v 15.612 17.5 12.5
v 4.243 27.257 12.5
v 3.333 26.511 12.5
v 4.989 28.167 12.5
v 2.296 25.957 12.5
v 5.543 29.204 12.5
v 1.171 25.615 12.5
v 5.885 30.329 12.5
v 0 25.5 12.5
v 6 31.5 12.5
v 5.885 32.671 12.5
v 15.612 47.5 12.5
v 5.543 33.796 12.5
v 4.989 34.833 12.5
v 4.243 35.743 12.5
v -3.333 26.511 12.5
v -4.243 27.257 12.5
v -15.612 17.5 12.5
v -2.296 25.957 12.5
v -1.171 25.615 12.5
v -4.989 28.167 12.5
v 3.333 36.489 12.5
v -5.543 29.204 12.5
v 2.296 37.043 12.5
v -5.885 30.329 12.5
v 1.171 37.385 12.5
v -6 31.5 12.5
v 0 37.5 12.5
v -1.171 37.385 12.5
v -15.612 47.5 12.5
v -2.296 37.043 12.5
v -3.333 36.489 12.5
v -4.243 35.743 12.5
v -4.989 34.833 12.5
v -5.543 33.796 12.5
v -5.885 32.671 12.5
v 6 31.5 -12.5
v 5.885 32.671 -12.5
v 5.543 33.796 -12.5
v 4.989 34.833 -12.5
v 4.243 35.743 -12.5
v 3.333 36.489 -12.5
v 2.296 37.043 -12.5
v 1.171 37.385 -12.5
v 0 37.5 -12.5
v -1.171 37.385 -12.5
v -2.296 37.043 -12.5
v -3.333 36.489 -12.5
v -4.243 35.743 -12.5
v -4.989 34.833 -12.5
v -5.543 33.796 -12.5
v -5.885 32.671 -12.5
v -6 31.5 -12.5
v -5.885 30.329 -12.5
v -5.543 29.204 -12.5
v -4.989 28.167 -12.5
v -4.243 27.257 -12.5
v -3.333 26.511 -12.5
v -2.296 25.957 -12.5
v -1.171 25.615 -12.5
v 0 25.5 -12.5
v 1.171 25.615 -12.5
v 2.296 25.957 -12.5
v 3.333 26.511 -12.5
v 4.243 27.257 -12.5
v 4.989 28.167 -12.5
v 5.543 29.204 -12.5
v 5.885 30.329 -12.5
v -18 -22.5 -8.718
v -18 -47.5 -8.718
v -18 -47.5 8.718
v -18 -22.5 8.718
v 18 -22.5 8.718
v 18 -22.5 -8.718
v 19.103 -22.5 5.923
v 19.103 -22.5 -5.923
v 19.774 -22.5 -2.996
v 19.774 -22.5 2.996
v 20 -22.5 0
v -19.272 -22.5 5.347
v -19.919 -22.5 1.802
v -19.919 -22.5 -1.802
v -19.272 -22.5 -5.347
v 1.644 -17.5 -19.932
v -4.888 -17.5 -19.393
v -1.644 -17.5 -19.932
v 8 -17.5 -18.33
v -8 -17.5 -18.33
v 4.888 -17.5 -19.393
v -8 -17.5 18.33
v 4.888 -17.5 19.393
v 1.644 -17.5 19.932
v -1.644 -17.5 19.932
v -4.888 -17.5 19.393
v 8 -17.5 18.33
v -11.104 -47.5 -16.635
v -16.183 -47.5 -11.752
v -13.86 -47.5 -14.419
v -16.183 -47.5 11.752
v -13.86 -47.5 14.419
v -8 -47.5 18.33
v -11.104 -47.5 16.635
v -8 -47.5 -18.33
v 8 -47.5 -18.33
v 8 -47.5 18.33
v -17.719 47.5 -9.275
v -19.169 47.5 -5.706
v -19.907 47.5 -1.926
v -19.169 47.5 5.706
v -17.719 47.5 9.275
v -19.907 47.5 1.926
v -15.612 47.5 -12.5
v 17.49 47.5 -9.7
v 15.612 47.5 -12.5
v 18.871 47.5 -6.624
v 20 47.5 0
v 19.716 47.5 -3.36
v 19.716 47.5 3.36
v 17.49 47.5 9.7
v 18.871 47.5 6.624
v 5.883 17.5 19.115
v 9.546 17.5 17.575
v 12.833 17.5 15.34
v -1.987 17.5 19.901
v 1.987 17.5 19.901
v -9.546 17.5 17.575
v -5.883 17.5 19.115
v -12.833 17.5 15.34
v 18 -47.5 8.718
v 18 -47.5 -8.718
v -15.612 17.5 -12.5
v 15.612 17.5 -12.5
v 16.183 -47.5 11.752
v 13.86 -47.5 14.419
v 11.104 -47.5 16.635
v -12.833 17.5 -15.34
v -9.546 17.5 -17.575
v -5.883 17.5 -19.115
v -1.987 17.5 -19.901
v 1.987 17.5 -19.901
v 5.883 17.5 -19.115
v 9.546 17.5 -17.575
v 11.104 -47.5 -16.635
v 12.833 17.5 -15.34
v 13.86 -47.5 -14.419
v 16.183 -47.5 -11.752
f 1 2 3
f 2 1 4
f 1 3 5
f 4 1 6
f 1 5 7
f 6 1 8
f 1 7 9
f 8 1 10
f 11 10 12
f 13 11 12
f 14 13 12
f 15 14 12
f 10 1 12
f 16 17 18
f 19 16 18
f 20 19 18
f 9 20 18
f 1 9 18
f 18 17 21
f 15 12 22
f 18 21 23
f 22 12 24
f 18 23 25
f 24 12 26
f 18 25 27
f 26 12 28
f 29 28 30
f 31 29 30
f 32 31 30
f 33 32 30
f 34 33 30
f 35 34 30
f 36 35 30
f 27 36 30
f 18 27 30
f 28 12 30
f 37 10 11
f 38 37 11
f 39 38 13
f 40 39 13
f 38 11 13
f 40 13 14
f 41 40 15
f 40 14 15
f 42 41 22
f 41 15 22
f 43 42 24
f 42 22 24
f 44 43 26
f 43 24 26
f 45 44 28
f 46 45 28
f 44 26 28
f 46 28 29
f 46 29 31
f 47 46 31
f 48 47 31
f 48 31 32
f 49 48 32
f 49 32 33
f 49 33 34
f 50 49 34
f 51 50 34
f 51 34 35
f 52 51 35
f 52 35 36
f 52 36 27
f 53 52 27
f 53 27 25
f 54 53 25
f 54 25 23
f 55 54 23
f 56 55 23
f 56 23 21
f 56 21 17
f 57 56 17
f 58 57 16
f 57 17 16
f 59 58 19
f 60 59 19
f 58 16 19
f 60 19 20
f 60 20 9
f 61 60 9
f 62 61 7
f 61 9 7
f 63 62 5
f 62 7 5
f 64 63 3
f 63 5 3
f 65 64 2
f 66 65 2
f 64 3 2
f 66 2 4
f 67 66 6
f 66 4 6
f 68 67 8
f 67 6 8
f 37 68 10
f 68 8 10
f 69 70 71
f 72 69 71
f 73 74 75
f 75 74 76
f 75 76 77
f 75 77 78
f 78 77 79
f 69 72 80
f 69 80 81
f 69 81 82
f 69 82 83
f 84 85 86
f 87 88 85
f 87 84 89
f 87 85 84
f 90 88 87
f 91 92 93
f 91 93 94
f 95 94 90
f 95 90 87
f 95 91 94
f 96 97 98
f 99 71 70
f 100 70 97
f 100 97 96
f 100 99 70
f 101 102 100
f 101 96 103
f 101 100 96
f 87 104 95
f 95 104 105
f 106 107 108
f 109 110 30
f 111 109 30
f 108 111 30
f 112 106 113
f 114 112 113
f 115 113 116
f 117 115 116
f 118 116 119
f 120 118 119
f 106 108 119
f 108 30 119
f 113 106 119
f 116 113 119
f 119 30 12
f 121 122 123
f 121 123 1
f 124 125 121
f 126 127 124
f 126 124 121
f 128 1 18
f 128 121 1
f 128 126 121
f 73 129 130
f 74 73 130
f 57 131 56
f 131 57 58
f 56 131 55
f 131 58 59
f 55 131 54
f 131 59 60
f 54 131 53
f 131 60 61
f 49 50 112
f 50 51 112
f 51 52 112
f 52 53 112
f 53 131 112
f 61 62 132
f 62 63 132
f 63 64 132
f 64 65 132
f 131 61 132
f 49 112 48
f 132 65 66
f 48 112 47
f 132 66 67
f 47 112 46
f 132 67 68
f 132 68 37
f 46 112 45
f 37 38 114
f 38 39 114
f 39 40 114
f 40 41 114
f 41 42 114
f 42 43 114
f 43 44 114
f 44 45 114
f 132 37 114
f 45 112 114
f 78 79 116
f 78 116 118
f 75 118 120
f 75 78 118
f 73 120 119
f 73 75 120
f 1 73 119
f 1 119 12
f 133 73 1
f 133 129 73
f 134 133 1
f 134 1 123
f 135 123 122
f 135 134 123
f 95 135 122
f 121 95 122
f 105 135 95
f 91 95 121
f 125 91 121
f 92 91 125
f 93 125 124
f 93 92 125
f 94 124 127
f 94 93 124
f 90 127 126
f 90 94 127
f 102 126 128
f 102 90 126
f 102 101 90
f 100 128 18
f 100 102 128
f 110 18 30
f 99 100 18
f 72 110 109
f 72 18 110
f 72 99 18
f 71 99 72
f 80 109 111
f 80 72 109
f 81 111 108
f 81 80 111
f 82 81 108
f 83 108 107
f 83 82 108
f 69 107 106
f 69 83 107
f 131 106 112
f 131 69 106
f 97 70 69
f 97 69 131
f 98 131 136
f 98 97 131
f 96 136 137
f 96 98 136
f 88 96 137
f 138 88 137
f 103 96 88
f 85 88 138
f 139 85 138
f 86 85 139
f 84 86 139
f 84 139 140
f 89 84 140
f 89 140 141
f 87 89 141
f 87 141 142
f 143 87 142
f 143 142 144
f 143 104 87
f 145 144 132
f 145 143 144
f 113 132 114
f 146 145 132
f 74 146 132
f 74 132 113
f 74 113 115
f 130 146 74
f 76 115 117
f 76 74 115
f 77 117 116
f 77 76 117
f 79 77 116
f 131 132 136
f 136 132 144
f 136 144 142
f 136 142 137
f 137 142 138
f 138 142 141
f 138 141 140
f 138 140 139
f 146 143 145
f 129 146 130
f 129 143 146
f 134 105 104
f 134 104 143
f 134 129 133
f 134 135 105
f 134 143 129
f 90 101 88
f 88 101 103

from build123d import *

# Parameters (mm, degrees)
F0_R      = 20
F1_DEPTH  = 47.5
F3_DEPTH  = 30
F5_DEPTH  = 25
F7_DEPTH  = 30
F8_R      = 6
F9_DEPTH  = 25
F10_DEPTH = 57.501


with BuildPart() as f1:
    # F0 (on Front) → F1 (new body, symmetric)
    with BuildSketch(Plane.XZ):
        Circle(F0_R)
    extrude(amount=F1_DEPTH, both=True)

    # F2 (on face) → F3 (cut)
    with BuildSketch(Plane.XZ.offset(47.5)):
        with BuildLine():
            ThreePointArc((8, 18.3303027798), (0, 20), (-8, 18.3303027798))
            Line((-8, 18.3303027798), (-8, -18.3303027798))
            ThreePointArc((-8, -18.3303027798), (0, -20), (8, -18.3303027798))
            Line((8, -18.3303027798), (8, 18.3303027798))
        make_face()
    extrude(amount=-F3_DEPTH, mode=Mode.SUBTRACT)

    # F4 (on face) → F5 (cut)
    with BuildSketch(Plane.XZ.offset(47.5)):
        with BuildLine():
            Line((-18, -8.7177978871), (-18, 8.7177978871))
            ThreePointArc((-18, 8.7177978871), (-20, 0), (-18, -8.7177978871))
        make_face()
        with BuildLine():
            ThreePointArc((20, 0), (19.4935886896, 4.472135955), (18, 8.7177978871))
            Line((18, 8.7177978871), (18, -8.7177978871))
            ThreePointArc((18, -8.7177978871), (19.4935886896, -4.472135955), (20, 0))
        make_face()
    extrude(amount=-F5_DEPTH, mode=Mode.SUBTRACT)

    # F6 (on face) → F7 (cut)
    with BuildSketch(Plane(origin=(0, 47.5, 0), x_dir=(-1, 0, 0), z_dir=(0, 1, 0))):
        with BuildLine():
            Line((-15.612494996, 12.5), (15.612494996, 12.5))
            ThreePointArc((15.612494996, 12.5), (0, 20), (-15.612494996, 12.5))
        make_face()
        with BuildLine():
            Line((15.612494996, -12.5), (-15.612494996, -12.5))
            ThreePointArc((-15.612494996, -12.5), (0, -20), (15.612494996, -12.5))
        make_face()
    extrude(amount=-F7_DEPTH, mode=Mode.SUBTRACT)

    # F8 (on face) → F9 (join)
    with BuildSketch(Plane.XY.offset(12.5)):
        with Locations((0, 31.5)):
            Circle(F8_R)
    extrude(amount=F9_DEPTH)

    # F10 (cut, through all): a face of the model
    f10_faces = [f1.faces().sort_by_distance(p)[0] for p in [
        (0, 31.5, 37.5),
    ]]
    extrude(f10_faces, amount=-F10_DEPTH, mode=Mode.SUBTRACT)


solid = f1.part
